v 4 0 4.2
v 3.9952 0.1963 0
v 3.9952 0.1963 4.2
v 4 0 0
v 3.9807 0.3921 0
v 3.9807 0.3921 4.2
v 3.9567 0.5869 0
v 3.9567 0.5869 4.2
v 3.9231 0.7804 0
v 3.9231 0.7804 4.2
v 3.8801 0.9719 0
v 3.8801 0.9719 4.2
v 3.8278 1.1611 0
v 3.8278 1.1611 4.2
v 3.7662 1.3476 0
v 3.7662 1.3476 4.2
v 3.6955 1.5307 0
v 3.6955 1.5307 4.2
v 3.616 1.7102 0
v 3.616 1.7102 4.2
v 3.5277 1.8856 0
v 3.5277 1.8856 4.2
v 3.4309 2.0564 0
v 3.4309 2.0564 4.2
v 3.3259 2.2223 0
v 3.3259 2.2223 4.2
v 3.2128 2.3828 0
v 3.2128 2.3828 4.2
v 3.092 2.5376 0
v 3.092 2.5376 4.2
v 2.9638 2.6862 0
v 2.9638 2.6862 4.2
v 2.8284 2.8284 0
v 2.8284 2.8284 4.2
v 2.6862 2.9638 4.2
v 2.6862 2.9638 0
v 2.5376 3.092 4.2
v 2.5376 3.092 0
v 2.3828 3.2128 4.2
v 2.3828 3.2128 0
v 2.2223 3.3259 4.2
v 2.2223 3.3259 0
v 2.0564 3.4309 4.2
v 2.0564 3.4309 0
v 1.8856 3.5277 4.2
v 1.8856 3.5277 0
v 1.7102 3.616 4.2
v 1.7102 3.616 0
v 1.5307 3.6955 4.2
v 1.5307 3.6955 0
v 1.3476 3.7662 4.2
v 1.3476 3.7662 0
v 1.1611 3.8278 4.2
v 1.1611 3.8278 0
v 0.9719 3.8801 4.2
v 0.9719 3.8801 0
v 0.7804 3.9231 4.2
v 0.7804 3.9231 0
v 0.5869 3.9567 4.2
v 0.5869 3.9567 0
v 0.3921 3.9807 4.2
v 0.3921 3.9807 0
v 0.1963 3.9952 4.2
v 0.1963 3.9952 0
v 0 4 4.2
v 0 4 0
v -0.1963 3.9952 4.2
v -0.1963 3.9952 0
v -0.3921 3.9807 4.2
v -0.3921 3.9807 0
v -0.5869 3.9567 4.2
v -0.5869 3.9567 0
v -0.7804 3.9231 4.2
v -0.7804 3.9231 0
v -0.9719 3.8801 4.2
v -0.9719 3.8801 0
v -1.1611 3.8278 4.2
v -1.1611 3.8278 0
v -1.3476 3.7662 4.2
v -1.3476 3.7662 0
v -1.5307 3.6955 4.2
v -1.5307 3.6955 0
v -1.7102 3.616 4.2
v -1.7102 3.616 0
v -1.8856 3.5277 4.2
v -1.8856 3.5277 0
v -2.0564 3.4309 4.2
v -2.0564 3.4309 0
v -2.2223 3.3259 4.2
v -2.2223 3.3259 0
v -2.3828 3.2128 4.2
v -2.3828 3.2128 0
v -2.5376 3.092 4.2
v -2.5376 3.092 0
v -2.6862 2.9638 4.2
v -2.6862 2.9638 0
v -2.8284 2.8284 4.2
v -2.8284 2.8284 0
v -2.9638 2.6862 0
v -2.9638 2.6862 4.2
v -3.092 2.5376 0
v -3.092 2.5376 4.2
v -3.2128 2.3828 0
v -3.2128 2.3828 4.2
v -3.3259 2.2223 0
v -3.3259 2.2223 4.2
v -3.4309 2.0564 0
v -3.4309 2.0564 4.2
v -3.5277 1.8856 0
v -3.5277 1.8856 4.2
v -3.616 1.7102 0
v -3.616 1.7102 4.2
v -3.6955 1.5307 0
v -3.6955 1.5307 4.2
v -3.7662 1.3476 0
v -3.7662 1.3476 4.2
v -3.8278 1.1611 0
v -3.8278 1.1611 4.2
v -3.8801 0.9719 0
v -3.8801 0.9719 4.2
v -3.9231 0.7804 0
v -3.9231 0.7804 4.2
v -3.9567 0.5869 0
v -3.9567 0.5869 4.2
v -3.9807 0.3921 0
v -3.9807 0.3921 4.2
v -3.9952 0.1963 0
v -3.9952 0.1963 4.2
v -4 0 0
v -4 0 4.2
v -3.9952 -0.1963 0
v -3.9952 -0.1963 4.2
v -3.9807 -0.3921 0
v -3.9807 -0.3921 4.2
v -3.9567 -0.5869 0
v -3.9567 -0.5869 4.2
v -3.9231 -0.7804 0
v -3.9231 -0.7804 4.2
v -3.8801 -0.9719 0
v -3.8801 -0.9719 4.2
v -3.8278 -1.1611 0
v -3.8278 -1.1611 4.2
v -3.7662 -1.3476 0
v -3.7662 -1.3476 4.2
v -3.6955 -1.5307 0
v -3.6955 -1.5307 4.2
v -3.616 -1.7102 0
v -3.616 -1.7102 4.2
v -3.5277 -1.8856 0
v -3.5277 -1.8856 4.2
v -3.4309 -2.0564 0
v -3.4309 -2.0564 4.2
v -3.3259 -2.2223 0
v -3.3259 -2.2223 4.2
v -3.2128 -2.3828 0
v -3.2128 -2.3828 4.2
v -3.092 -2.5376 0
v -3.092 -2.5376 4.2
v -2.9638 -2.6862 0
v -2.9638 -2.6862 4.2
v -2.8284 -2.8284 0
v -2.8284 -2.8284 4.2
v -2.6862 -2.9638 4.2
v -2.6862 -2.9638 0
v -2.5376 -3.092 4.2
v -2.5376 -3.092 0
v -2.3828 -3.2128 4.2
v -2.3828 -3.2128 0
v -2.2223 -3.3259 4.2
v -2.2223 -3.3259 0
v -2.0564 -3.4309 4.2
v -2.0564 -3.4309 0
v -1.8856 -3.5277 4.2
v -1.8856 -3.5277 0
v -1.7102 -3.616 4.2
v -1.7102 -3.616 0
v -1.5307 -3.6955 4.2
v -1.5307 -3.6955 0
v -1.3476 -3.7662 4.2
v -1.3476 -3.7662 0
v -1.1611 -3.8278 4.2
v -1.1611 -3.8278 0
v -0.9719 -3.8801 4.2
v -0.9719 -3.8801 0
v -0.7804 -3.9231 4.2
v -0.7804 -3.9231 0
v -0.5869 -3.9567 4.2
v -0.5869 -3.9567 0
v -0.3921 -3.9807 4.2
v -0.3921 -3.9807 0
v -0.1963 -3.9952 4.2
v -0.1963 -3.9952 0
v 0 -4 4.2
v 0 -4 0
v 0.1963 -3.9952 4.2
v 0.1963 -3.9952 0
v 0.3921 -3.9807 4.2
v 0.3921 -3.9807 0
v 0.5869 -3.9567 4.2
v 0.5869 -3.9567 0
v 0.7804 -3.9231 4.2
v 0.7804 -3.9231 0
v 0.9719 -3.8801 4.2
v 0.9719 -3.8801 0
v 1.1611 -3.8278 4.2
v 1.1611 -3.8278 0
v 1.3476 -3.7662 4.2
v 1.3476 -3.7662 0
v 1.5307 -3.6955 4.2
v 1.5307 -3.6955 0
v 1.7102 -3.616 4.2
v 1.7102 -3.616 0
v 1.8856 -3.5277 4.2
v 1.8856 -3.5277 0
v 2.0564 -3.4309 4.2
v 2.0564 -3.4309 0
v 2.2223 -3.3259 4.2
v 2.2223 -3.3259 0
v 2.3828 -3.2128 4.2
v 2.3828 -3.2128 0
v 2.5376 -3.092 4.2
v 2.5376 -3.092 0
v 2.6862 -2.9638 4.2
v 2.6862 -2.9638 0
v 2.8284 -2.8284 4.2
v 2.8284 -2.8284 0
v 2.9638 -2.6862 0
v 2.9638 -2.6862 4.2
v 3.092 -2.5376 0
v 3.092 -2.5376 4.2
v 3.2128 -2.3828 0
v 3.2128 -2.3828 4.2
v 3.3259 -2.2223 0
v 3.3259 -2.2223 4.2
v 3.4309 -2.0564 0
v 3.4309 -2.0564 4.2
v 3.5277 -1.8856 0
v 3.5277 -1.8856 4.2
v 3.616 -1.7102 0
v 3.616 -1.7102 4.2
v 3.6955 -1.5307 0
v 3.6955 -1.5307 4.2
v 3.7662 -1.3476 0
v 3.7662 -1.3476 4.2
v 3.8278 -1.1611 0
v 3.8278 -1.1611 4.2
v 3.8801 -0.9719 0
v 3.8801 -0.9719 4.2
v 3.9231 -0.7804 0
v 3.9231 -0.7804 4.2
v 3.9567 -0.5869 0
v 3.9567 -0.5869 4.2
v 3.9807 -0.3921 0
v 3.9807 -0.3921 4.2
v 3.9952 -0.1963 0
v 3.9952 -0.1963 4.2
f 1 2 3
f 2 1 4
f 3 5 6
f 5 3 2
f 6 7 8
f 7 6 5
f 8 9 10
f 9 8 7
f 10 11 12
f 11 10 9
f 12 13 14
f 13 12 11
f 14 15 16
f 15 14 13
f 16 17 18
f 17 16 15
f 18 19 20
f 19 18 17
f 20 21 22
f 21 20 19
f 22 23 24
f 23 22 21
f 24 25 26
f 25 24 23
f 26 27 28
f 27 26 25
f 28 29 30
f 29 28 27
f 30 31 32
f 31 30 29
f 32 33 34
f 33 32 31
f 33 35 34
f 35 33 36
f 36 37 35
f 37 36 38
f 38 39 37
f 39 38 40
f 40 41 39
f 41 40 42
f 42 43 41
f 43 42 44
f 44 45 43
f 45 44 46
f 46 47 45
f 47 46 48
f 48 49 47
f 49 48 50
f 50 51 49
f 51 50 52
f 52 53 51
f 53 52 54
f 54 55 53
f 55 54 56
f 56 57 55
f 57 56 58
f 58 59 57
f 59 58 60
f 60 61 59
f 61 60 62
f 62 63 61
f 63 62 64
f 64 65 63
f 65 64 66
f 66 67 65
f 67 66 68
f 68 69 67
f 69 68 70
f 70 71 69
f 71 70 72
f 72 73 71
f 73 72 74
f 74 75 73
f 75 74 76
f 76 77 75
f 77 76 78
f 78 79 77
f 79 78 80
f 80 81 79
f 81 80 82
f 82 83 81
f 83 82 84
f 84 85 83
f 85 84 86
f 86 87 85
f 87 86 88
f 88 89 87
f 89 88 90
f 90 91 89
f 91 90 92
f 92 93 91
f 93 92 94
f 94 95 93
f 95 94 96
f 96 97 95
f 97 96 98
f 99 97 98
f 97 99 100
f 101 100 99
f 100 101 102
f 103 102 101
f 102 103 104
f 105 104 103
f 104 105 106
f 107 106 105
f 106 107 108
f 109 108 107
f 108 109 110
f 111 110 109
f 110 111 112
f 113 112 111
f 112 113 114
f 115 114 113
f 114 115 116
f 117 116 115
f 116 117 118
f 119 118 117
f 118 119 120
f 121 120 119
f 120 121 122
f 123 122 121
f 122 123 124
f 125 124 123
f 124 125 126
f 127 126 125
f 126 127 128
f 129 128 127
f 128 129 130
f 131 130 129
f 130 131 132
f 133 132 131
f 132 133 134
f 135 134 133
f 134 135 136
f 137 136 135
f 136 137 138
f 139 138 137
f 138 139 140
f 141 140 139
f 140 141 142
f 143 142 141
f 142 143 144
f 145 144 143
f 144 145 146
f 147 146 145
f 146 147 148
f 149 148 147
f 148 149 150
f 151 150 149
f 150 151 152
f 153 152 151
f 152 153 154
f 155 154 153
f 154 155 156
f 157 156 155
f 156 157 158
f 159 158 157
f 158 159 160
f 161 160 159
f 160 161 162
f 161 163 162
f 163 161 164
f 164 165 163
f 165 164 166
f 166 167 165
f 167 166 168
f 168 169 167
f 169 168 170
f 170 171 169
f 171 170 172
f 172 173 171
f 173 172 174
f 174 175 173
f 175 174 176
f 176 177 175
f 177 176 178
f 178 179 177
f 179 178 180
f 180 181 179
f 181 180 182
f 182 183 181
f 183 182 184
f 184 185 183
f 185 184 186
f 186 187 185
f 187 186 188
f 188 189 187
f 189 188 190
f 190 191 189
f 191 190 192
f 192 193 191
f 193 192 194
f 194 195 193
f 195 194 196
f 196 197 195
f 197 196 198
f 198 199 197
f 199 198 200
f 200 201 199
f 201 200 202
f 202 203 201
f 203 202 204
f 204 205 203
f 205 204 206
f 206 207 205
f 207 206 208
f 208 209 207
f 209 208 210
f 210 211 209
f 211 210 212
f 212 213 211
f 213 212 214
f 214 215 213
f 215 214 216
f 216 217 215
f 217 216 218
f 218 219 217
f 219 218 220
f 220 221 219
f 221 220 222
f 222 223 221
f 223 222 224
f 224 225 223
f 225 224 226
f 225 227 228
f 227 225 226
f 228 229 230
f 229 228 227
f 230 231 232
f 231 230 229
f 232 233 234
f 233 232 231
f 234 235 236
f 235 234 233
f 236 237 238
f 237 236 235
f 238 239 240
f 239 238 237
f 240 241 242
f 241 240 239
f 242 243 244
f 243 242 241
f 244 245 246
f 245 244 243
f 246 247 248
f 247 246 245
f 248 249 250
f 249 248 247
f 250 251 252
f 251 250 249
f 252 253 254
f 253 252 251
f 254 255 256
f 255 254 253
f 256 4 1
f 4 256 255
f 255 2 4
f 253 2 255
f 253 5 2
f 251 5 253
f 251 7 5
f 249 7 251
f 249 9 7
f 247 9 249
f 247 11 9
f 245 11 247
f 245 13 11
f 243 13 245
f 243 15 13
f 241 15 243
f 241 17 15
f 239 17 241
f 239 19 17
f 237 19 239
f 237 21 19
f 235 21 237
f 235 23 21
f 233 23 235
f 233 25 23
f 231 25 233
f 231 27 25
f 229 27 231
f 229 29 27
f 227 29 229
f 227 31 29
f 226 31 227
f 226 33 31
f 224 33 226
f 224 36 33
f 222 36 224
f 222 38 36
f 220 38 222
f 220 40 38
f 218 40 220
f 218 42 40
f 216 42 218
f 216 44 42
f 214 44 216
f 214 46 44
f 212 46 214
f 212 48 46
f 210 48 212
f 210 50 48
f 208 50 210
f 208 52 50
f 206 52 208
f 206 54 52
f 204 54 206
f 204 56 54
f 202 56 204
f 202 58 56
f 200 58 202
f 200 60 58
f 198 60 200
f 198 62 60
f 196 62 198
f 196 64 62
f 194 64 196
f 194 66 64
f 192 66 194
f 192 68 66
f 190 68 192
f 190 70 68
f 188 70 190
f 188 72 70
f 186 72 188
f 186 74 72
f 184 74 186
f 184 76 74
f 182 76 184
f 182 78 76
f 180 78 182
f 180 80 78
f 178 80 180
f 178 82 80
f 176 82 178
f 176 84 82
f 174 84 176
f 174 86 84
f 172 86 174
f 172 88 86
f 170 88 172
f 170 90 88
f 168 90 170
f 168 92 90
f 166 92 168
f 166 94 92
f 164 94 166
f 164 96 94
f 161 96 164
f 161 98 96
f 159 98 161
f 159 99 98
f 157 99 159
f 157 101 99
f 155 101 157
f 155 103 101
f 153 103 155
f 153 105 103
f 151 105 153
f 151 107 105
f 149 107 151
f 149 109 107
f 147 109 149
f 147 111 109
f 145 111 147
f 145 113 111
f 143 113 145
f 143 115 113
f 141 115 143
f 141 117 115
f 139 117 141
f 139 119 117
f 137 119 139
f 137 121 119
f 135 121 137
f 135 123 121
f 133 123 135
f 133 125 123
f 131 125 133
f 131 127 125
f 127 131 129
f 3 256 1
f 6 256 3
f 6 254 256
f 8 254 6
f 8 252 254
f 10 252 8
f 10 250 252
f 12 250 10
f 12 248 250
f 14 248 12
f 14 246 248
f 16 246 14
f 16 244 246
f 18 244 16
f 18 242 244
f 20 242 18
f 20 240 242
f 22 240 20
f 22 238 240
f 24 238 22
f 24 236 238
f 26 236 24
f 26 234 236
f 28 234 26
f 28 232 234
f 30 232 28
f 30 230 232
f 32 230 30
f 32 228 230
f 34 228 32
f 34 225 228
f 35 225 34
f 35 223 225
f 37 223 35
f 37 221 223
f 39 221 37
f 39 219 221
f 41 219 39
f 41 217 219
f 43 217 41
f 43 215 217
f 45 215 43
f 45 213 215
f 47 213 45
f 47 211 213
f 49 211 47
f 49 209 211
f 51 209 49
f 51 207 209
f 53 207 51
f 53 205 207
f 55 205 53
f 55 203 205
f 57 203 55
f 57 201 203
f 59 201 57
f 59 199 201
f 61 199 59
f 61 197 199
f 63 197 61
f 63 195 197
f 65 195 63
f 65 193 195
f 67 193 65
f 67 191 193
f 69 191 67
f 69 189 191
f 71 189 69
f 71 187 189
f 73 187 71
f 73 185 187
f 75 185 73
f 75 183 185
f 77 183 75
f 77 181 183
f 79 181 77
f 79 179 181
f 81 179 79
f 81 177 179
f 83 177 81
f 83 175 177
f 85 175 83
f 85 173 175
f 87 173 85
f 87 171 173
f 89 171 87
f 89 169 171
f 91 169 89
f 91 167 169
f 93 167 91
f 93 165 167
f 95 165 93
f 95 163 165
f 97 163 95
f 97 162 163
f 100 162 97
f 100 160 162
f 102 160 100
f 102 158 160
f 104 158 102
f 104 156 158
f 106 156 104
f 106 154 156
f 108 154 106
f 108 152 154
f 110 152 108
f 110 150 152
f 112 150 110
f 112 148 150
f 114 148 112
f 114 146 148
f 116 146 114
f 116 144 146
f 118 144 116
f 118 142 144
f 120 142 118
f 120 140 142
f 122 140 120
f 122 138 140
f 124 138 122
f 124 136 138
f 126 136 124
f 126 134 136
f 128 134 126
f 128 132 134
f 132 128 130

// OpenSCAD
$fn = 128;

diameter = 8.0;
height = 4.2;

cylinder(d = diameter, h = height);
